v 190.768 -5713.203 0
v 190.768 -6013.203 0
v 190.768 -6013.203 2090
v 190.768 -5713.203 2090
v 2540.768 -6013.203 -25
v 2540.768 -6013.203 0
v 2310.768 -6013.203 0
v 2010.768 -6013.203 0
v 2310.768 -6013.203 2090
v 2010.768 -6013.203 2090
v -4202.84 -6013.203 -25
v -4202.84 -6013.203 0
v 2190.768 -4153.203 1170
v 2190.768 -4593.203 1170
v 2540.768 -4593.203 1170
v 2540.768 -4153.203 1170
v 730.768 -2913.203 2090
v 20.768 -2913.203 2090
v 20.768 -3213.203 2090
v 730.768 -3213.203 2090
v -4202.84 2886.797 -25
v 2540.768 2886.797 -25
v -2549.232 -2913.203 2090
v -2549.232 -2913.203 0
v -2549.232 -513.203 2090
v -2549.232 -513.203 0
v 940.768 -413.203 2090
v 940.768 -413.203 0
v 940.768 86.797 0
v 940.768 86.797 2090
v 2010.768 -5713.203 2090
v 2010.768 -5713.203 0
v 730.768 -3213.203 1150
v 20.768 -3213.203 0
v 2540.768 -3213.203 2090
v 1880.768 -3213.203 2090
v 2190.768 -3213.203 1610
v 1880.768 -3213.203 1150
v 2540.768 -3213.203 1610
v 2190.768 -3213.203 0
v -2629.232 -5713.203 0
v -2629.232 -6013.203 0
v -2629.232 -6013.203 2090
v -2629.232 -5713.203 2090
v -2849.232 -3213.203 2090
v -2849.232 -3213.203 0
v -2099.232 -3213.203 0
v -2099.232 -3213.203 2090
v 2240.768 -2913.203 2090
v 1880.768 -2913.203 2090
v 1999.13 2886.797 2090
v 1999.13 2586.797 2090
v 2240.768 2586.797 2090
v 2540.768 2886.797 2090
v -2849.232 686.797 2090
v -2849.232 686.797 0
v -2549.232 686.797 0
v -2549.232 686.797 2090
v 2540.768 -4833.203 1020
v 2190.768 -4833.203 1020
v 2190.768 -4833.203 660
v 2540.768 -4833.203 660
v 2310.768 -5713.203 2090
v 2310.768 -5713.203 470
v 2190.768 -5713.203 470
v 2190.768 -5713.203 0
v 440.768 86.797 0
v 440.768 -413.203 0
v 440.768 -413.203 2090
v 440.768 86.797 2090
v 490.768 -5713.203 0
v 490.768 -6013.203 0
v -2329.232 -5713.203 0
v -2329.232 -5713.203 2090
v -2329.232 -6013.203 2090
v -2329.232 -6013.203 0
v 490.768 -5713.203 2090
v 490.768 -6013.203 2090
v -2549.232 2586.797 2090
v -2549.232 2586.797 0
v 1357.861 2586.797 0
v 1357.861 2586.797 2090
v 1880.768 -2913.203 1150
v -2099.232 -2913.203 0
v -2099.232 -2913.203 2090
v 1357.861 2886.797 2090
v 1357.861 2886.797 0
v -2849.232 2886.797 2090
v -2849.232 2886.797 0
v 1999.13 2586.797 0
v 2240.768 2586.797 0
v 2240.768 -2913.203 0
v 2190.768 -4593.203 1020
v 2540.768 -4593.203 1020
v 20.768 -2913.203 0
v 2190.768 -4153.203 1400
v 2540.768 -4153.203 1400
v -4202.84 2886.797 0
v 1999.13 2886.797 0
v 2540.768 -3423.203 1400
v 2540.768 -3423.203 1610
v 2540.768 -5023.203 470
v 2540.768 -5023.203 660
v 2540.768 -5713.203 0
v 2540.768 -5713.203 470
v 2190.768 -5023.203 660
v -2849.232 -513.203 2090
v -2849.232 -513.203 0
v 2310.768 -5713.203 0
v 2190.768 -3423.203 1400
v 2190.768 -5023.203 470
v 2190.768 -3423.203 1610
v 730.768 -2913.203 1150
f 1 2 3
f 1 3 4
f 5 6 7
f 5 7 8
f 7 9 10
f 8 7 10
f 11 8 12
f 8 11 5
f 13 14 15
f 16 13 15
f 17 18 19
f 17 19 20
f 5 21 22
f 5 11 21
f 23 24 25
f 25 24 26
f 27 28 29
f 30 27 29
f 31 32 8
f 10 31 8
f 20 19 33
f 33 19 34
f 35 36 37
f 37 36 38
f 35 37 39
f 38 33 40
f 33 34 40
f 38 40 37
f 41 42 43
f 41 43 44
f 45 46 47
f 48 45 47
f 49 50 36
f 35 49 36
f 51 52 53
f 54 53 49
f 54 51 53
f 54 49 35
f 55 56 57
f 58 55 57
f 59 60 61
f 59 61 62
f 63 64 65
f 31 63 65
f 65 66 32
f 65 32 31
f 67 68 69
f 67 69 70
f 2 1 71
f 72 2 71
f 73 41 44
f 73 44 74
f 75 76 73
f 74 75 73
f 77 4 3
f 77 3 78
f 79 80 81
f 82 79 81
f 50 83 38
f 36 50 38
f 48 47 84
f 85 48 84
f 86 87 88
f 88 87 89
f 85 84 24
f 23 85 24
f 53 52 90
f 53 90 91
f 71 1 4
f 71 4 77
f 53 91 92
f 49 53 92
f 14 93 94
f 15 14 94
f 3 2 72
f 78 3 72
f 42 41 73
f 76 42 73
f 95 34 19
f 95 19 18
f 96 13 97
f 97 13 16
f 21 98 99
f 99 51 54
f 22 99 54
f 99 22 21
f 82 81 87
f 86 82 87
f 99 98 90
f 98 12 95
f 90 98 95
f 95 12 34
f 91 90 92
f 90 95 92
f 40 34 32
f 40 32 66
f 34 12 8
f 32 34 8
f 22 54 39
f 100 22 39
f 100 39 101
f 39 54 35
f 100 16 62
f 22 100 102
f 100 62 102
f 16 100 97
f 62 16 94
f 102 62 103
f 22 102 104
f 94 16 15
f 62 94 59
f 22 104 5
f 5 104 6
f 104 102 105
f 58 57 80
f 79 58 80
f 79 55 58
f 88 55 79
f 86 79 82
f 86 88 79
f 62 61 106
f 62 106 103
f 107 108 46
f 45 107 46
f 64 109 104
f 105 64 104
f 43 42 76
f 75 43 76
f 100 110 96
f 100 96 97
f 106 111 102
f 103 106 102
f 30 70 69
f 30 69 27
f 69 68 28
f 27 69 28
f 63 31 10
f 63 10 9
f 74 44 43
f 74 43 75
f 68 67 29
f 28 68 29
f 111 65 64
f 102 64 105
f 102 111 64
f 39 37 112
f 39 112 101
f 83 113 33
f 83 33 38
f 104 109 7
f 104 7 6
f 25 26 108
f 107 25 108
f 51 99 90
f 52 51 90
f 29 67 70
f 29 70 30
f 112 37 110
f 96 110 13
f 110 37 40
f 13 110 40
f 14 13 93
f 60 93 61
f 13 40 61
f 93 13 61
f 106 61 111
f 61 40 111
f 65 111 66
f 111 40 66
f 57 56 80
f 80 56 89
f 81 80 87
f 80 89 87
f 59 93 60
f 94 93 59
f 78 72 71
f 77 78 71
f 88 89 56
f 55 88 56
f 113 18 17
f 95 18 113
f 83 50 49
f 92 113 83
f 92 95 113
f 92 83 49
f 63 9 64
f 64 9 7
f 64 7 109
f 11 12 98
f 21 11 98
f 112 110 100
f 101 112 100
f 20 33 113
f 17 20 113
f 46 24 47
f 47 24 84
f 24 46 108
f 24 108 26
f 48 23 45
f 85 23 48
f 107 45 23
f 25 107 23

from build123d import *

# Parameters (mm, degrees)
F0_W      = 350
F0_H      = 210
F1_DEPTH  = 1610
F0_H_2    = 730
F2_DEPTH  = 1400
F0_H_3    = 440
F3_DEPTH  = 1170
F0_H_4    = 240
F4_DEPTH  = 1020
F0_H_5    = 190
F5_DEPTH  = 660
F6_DEPTH  = 470
F0_W_2    = 300
F0_H_6    = 300
F7_DEPTH  = 2090
F8_DEPTH  = 2090
F0_W_3    = 500
F0_H_7    = 500
F0_W_4    = 710
F10_DEPTH = 25
F11_W     = 1150
F11_H     = 300
F12_DEPTH = 1150


# Not quite as in the source:
# - a feature of the source that left no trace in its solid (it failed there, or was rolled back) is left out


with BuildPart() as f1:
    # F0 (on Top) → F1 (new body)
    with BuildSketch(Plane.XY):
        with Locations((2365.7681007385, -3318.20271492)):
            Rectangle(F0_W, F0_H)
    extrude(amount=F1_DEPTH)

    # F0 (on Top) → F2 (join)
    with BuildSketch(Plane.XY):
        with Locations((2365.7681007385, -3788.20271492)):
            Rectangle(F0_W, F0_H_2)
    extrude(amount=F2_DEPTH)

    # F0 (on Top) → F3 (join)
    with BuildSketch(Plane.XY):
        with Locations((2365.7681007385, -4373.20271492)):
            Rectangle(F0_W, F0_H_3)
    extrude(amount=F3_DEPTH)

    # F0 (on Top) → F4 (join)
    with BuildSketch(Plane.XY):
        with Locations((2365.7681007385, -4713.20271492)):
            Rectangle(F0_W, F0_H_4)
    extrude(amount=F4_DEPTH)

    # F0 (on Top) → F5 (join)
    with BuildSketch(Plane.XY):
        with Locations((2365.7681007385, -4928.20271492)):
            Rectangle(F0_W, F0_H_5)
    extrude(amount=F5_DEPTH)

    # F0 (on Top) → F6 (join)
    with BuildSketch(Plane.XY):
        Polygon((2540.7681007385, -5023.20271492), (2190.7681007385, -5023.20271492), (2190.7681007385, -5713.20271492), (2310.7681007385, -5713.20271492), (2540.7681007385, -5713.20271492), align=None)
    extrude(amount=F6_DEPTH)

    # F0 (on Top) → F7, piece 3 (join)
    with BuildSketch(Plane.XY):
        Polygon((2310.7681007385, -5713.20271492), (2190.7681007385, -5713.20271492), (2010.7681007385, -5713.20271492), (2010.7681007385, -6013.20271492), (2310.7681007385, -6013.20271492), align=None)
    extrude(amount=F7_DEPTH)

    # F0 (on Top) → F8, piece 5 (join)
    with BuildSketch(Plane.XY):
        Polygon((2240.7681007385, -2913.20271492), (1880.7681007385, -2913.20271492), (1880.7681007385, -3213.20271492), (2190.7681007385, -3213.20271492), (2540.7681007385, -3213.20271492), (2540.7681007385, 2886.79728508), (1999.1303939819, 2886.79728508), (1999.1303939819, 2586.79728508), (2240.7681007385, 2586.79728508), align=None)
    extrude(amount=F8_DEPTH)



with BuildPart() as f7:
    # F0 (on Top) → F7 (new body)
    with BuildSketch(Plane.XY):
        with Locations((-2479.2318992615, -5863.20271492)):
            Rectangle(F0_W_2, F0_H_6)
    extrude(amount=F7_DEPTH)


with BuildPart() as f7b:
    # F0 (on Top) → F7, piece 2 (new body)
    with BuildSketch(Plane.XY):
        with Locations((340.7681007385, -5863.20271492)):
            Rectangle(F0_W_2, F0_H_6)
    extrude(amount=F7_DEPTH)


with BuildPart() as f8:
    # F0 (on Top) → F8 (new body)
    with BuildSketch(Plane.XY):
        Polygon((-2849.2318992615, 686.79728508), (-2549.2318992615, 686.79728508), (-2549.2318992615, 2586.79728508), (1357.8613657951, 2586.79728508), (1357.8613657951, 2886.79728508), (-2849.2318992615, 2886.79728508), align=None)
    extrude(amount=F8_DEPTH)


with BuildPart() as f8b:
    # F0 (on Top) → F8, piece 2 (new body)
    with BuildSketch(Plane.XY):
        with Locations((690.7681007385, -163.20271492)):
            Rectangle(F0_W_3, F0_H_7)
    extrude(amount=F8_DEPTH)


with BuildPart() as f8c:
    # F0 (on Top) → F8, piece 3 (new body)
    with BuildSketch(Plane.XY):
        Polygon((-2099.2318992615, -2913.20271492), (-2549.2318992615, -2913.20271492), (-2549.2318992615, -513.20271492), (-2849.2318992615, -513.20271492), (-2849.2318992615, -3213.20271492), (-2099.2318992615, -3213.20271492), align=None)
    extrude(amount=F8_DEPTH)


with BuildPart() as f8d:
    # F0 (on Top) → F8, piece 4 (new body)
    with BuildSketch(Plane.XY):
        with Locations((375.7681007385, -3063.20271492)):
            Rectangle(F0_W_4, F0_H_6)
    extrude(amount=F8_DEPTH)


with BuildPart() as f1_1:
    add(f1.part)

    add(f8d.part)  # F10 merges F8d
    # F9 (on face) → F10 (join)
    with BuildSketch(Plane(origin=(0, 0, 0), x_dir=(1, 0, 0), z_dir=(0, 0, -1))):
        Polygon((-4202.8398513794, -2886.79728508), (-2849.2318992615, -2886.79728508), (-2849.2318992615, -686.79728508), (-2549.2318992615, -686.79728508), (-2549.2318992615, -2586.79728508), (1357.8613657951, -2586.79728508), (1357.8613657951, -2886.79728508), (2540.7681007385, -2886.79728508), (2540.7681007385, 6013.20271492), (-2849.2318992615, 6013.20271492), (-4202.8398513794, 6013.20271492), align=None)
        Polygon((-2849.2318992615, -686.79728508), (-2849.2318992615, -2886.79728508), (1357.8613657951, -2886.79728508), (1357.8613657951, -2586.79728508), (-2549.2318992615, -2586.79728508), (-2549.2318992615, -686.79728508), align=None)
    extrude(amount=F10_DEPTH)

    # F11 (on face) → F12 (join)
    with BuildSketch(Plane.XY):
        with Locations((1305.7681007385, -3063.20271492)):
            Rectangle(F11_W, F11_H)
    extrude(amount=F12_DEPTH)


solid = Compound([f7.part, f7b.part, f8.part, f8b.part, f8c.part, f1_1.part])
